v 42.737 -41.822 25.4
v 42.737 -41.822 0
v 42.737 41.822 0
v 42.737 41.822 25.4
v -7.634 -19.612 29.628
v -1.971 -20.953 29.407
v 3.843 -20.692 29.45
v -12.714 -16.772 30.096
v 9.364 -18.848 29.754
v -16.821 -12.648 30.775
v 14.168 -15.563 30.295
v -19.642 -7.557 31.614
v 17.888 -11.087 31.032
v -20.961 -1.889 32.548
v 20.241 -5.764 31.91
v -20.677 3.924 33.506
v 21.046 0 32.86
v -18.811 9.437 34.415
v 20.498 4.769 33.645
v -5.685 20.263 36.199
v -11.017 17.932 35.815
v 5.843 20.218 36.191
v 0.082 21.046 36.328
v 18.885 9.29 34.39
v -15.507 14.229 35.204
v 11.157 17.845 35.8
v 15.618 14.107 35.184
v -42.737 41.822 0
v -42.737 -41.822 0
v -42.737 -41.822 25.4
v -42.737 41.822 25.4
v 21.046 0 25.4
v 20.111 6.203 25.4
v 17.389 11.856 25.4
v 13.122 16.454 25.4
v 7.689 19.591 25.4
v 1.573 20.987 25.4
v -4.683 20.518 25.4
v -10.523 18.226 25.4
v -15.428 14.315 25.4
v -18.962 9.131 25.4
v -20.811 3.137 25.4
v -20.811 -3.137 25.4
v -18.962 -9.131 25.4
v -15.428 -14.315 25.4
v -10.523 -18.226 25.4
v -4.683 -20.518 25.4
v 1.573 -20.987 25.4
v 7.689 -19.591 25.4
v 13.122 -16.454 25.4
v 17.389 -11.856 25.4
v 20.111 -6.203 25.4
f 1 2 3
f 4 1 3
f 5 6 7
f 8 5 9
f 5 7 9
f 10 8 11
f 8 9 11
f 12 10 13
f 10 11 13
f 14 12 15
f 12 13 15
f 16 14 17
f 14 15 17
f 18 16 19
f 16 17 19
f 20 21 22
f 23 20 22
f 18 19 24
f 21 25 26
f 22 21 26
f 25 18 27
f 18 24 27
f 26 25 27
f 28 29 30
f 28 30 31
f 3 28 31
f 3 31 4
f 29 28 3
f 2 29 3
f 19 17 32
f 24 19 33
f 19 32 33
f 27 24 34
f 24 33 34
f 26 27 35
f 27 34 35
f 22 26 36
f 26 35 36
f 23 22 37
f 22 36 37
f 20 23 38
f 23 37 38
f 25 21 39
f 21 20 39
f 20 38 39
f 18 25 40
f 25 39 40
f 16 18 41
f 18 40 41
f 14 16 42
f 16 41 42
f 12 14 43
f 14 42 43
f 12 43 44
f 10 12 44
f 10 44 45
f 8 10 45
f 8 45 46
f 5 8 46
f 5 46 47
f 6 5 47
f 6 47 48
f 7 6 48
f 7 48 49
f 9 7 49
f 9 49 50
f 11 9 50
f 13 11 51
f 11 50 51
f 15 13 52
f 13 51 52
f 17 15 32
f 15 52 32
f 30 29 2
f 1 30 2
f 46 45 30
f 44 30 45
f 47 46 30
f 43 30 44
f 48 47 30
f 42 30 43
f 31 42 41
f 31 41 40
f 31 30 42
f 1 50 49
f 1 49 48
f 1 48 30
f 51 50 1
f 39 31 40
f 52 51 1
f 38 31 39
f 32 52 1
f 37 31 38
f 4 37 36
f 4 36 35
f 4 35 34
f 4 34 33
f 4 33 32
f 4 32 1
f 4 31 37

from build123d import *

# Parameters (mm, degrees)
F0_W     = 85.474864
F0_H     = 83.643266
F2_DEPTH = 25.4
F1_R     = 21.045821
F3_DEPTH = 44.958
F5_DEPTH = 32.766


with BuildPart() as f2:
    # F0 (on Top) → F2 (new body)
    with BuildSketch(Plane.XY):
        Rectangle(F0_W, F0_H)
    extrude(amount=F2_DEPTH)

    # F1 (on face) → F3 (join)
    with BuildSketch(Plane.XY):
        Circle(F1_R)
    extrude(amount=F3_DEPTH)

    # F4 (on Right) → F5 (cut, symmetric)
    with BuildSketch(Plane.YZ):
        Polygon((25.421897, 37.048966), (25.421897, 48.478965), (-27.195517, 49.070172), (-27.195517, 28.37793), align=None)
    extrude(amount=F5_DEPTH, both=True, mode=Mode.SUBTRACT)


solid = f2.part
